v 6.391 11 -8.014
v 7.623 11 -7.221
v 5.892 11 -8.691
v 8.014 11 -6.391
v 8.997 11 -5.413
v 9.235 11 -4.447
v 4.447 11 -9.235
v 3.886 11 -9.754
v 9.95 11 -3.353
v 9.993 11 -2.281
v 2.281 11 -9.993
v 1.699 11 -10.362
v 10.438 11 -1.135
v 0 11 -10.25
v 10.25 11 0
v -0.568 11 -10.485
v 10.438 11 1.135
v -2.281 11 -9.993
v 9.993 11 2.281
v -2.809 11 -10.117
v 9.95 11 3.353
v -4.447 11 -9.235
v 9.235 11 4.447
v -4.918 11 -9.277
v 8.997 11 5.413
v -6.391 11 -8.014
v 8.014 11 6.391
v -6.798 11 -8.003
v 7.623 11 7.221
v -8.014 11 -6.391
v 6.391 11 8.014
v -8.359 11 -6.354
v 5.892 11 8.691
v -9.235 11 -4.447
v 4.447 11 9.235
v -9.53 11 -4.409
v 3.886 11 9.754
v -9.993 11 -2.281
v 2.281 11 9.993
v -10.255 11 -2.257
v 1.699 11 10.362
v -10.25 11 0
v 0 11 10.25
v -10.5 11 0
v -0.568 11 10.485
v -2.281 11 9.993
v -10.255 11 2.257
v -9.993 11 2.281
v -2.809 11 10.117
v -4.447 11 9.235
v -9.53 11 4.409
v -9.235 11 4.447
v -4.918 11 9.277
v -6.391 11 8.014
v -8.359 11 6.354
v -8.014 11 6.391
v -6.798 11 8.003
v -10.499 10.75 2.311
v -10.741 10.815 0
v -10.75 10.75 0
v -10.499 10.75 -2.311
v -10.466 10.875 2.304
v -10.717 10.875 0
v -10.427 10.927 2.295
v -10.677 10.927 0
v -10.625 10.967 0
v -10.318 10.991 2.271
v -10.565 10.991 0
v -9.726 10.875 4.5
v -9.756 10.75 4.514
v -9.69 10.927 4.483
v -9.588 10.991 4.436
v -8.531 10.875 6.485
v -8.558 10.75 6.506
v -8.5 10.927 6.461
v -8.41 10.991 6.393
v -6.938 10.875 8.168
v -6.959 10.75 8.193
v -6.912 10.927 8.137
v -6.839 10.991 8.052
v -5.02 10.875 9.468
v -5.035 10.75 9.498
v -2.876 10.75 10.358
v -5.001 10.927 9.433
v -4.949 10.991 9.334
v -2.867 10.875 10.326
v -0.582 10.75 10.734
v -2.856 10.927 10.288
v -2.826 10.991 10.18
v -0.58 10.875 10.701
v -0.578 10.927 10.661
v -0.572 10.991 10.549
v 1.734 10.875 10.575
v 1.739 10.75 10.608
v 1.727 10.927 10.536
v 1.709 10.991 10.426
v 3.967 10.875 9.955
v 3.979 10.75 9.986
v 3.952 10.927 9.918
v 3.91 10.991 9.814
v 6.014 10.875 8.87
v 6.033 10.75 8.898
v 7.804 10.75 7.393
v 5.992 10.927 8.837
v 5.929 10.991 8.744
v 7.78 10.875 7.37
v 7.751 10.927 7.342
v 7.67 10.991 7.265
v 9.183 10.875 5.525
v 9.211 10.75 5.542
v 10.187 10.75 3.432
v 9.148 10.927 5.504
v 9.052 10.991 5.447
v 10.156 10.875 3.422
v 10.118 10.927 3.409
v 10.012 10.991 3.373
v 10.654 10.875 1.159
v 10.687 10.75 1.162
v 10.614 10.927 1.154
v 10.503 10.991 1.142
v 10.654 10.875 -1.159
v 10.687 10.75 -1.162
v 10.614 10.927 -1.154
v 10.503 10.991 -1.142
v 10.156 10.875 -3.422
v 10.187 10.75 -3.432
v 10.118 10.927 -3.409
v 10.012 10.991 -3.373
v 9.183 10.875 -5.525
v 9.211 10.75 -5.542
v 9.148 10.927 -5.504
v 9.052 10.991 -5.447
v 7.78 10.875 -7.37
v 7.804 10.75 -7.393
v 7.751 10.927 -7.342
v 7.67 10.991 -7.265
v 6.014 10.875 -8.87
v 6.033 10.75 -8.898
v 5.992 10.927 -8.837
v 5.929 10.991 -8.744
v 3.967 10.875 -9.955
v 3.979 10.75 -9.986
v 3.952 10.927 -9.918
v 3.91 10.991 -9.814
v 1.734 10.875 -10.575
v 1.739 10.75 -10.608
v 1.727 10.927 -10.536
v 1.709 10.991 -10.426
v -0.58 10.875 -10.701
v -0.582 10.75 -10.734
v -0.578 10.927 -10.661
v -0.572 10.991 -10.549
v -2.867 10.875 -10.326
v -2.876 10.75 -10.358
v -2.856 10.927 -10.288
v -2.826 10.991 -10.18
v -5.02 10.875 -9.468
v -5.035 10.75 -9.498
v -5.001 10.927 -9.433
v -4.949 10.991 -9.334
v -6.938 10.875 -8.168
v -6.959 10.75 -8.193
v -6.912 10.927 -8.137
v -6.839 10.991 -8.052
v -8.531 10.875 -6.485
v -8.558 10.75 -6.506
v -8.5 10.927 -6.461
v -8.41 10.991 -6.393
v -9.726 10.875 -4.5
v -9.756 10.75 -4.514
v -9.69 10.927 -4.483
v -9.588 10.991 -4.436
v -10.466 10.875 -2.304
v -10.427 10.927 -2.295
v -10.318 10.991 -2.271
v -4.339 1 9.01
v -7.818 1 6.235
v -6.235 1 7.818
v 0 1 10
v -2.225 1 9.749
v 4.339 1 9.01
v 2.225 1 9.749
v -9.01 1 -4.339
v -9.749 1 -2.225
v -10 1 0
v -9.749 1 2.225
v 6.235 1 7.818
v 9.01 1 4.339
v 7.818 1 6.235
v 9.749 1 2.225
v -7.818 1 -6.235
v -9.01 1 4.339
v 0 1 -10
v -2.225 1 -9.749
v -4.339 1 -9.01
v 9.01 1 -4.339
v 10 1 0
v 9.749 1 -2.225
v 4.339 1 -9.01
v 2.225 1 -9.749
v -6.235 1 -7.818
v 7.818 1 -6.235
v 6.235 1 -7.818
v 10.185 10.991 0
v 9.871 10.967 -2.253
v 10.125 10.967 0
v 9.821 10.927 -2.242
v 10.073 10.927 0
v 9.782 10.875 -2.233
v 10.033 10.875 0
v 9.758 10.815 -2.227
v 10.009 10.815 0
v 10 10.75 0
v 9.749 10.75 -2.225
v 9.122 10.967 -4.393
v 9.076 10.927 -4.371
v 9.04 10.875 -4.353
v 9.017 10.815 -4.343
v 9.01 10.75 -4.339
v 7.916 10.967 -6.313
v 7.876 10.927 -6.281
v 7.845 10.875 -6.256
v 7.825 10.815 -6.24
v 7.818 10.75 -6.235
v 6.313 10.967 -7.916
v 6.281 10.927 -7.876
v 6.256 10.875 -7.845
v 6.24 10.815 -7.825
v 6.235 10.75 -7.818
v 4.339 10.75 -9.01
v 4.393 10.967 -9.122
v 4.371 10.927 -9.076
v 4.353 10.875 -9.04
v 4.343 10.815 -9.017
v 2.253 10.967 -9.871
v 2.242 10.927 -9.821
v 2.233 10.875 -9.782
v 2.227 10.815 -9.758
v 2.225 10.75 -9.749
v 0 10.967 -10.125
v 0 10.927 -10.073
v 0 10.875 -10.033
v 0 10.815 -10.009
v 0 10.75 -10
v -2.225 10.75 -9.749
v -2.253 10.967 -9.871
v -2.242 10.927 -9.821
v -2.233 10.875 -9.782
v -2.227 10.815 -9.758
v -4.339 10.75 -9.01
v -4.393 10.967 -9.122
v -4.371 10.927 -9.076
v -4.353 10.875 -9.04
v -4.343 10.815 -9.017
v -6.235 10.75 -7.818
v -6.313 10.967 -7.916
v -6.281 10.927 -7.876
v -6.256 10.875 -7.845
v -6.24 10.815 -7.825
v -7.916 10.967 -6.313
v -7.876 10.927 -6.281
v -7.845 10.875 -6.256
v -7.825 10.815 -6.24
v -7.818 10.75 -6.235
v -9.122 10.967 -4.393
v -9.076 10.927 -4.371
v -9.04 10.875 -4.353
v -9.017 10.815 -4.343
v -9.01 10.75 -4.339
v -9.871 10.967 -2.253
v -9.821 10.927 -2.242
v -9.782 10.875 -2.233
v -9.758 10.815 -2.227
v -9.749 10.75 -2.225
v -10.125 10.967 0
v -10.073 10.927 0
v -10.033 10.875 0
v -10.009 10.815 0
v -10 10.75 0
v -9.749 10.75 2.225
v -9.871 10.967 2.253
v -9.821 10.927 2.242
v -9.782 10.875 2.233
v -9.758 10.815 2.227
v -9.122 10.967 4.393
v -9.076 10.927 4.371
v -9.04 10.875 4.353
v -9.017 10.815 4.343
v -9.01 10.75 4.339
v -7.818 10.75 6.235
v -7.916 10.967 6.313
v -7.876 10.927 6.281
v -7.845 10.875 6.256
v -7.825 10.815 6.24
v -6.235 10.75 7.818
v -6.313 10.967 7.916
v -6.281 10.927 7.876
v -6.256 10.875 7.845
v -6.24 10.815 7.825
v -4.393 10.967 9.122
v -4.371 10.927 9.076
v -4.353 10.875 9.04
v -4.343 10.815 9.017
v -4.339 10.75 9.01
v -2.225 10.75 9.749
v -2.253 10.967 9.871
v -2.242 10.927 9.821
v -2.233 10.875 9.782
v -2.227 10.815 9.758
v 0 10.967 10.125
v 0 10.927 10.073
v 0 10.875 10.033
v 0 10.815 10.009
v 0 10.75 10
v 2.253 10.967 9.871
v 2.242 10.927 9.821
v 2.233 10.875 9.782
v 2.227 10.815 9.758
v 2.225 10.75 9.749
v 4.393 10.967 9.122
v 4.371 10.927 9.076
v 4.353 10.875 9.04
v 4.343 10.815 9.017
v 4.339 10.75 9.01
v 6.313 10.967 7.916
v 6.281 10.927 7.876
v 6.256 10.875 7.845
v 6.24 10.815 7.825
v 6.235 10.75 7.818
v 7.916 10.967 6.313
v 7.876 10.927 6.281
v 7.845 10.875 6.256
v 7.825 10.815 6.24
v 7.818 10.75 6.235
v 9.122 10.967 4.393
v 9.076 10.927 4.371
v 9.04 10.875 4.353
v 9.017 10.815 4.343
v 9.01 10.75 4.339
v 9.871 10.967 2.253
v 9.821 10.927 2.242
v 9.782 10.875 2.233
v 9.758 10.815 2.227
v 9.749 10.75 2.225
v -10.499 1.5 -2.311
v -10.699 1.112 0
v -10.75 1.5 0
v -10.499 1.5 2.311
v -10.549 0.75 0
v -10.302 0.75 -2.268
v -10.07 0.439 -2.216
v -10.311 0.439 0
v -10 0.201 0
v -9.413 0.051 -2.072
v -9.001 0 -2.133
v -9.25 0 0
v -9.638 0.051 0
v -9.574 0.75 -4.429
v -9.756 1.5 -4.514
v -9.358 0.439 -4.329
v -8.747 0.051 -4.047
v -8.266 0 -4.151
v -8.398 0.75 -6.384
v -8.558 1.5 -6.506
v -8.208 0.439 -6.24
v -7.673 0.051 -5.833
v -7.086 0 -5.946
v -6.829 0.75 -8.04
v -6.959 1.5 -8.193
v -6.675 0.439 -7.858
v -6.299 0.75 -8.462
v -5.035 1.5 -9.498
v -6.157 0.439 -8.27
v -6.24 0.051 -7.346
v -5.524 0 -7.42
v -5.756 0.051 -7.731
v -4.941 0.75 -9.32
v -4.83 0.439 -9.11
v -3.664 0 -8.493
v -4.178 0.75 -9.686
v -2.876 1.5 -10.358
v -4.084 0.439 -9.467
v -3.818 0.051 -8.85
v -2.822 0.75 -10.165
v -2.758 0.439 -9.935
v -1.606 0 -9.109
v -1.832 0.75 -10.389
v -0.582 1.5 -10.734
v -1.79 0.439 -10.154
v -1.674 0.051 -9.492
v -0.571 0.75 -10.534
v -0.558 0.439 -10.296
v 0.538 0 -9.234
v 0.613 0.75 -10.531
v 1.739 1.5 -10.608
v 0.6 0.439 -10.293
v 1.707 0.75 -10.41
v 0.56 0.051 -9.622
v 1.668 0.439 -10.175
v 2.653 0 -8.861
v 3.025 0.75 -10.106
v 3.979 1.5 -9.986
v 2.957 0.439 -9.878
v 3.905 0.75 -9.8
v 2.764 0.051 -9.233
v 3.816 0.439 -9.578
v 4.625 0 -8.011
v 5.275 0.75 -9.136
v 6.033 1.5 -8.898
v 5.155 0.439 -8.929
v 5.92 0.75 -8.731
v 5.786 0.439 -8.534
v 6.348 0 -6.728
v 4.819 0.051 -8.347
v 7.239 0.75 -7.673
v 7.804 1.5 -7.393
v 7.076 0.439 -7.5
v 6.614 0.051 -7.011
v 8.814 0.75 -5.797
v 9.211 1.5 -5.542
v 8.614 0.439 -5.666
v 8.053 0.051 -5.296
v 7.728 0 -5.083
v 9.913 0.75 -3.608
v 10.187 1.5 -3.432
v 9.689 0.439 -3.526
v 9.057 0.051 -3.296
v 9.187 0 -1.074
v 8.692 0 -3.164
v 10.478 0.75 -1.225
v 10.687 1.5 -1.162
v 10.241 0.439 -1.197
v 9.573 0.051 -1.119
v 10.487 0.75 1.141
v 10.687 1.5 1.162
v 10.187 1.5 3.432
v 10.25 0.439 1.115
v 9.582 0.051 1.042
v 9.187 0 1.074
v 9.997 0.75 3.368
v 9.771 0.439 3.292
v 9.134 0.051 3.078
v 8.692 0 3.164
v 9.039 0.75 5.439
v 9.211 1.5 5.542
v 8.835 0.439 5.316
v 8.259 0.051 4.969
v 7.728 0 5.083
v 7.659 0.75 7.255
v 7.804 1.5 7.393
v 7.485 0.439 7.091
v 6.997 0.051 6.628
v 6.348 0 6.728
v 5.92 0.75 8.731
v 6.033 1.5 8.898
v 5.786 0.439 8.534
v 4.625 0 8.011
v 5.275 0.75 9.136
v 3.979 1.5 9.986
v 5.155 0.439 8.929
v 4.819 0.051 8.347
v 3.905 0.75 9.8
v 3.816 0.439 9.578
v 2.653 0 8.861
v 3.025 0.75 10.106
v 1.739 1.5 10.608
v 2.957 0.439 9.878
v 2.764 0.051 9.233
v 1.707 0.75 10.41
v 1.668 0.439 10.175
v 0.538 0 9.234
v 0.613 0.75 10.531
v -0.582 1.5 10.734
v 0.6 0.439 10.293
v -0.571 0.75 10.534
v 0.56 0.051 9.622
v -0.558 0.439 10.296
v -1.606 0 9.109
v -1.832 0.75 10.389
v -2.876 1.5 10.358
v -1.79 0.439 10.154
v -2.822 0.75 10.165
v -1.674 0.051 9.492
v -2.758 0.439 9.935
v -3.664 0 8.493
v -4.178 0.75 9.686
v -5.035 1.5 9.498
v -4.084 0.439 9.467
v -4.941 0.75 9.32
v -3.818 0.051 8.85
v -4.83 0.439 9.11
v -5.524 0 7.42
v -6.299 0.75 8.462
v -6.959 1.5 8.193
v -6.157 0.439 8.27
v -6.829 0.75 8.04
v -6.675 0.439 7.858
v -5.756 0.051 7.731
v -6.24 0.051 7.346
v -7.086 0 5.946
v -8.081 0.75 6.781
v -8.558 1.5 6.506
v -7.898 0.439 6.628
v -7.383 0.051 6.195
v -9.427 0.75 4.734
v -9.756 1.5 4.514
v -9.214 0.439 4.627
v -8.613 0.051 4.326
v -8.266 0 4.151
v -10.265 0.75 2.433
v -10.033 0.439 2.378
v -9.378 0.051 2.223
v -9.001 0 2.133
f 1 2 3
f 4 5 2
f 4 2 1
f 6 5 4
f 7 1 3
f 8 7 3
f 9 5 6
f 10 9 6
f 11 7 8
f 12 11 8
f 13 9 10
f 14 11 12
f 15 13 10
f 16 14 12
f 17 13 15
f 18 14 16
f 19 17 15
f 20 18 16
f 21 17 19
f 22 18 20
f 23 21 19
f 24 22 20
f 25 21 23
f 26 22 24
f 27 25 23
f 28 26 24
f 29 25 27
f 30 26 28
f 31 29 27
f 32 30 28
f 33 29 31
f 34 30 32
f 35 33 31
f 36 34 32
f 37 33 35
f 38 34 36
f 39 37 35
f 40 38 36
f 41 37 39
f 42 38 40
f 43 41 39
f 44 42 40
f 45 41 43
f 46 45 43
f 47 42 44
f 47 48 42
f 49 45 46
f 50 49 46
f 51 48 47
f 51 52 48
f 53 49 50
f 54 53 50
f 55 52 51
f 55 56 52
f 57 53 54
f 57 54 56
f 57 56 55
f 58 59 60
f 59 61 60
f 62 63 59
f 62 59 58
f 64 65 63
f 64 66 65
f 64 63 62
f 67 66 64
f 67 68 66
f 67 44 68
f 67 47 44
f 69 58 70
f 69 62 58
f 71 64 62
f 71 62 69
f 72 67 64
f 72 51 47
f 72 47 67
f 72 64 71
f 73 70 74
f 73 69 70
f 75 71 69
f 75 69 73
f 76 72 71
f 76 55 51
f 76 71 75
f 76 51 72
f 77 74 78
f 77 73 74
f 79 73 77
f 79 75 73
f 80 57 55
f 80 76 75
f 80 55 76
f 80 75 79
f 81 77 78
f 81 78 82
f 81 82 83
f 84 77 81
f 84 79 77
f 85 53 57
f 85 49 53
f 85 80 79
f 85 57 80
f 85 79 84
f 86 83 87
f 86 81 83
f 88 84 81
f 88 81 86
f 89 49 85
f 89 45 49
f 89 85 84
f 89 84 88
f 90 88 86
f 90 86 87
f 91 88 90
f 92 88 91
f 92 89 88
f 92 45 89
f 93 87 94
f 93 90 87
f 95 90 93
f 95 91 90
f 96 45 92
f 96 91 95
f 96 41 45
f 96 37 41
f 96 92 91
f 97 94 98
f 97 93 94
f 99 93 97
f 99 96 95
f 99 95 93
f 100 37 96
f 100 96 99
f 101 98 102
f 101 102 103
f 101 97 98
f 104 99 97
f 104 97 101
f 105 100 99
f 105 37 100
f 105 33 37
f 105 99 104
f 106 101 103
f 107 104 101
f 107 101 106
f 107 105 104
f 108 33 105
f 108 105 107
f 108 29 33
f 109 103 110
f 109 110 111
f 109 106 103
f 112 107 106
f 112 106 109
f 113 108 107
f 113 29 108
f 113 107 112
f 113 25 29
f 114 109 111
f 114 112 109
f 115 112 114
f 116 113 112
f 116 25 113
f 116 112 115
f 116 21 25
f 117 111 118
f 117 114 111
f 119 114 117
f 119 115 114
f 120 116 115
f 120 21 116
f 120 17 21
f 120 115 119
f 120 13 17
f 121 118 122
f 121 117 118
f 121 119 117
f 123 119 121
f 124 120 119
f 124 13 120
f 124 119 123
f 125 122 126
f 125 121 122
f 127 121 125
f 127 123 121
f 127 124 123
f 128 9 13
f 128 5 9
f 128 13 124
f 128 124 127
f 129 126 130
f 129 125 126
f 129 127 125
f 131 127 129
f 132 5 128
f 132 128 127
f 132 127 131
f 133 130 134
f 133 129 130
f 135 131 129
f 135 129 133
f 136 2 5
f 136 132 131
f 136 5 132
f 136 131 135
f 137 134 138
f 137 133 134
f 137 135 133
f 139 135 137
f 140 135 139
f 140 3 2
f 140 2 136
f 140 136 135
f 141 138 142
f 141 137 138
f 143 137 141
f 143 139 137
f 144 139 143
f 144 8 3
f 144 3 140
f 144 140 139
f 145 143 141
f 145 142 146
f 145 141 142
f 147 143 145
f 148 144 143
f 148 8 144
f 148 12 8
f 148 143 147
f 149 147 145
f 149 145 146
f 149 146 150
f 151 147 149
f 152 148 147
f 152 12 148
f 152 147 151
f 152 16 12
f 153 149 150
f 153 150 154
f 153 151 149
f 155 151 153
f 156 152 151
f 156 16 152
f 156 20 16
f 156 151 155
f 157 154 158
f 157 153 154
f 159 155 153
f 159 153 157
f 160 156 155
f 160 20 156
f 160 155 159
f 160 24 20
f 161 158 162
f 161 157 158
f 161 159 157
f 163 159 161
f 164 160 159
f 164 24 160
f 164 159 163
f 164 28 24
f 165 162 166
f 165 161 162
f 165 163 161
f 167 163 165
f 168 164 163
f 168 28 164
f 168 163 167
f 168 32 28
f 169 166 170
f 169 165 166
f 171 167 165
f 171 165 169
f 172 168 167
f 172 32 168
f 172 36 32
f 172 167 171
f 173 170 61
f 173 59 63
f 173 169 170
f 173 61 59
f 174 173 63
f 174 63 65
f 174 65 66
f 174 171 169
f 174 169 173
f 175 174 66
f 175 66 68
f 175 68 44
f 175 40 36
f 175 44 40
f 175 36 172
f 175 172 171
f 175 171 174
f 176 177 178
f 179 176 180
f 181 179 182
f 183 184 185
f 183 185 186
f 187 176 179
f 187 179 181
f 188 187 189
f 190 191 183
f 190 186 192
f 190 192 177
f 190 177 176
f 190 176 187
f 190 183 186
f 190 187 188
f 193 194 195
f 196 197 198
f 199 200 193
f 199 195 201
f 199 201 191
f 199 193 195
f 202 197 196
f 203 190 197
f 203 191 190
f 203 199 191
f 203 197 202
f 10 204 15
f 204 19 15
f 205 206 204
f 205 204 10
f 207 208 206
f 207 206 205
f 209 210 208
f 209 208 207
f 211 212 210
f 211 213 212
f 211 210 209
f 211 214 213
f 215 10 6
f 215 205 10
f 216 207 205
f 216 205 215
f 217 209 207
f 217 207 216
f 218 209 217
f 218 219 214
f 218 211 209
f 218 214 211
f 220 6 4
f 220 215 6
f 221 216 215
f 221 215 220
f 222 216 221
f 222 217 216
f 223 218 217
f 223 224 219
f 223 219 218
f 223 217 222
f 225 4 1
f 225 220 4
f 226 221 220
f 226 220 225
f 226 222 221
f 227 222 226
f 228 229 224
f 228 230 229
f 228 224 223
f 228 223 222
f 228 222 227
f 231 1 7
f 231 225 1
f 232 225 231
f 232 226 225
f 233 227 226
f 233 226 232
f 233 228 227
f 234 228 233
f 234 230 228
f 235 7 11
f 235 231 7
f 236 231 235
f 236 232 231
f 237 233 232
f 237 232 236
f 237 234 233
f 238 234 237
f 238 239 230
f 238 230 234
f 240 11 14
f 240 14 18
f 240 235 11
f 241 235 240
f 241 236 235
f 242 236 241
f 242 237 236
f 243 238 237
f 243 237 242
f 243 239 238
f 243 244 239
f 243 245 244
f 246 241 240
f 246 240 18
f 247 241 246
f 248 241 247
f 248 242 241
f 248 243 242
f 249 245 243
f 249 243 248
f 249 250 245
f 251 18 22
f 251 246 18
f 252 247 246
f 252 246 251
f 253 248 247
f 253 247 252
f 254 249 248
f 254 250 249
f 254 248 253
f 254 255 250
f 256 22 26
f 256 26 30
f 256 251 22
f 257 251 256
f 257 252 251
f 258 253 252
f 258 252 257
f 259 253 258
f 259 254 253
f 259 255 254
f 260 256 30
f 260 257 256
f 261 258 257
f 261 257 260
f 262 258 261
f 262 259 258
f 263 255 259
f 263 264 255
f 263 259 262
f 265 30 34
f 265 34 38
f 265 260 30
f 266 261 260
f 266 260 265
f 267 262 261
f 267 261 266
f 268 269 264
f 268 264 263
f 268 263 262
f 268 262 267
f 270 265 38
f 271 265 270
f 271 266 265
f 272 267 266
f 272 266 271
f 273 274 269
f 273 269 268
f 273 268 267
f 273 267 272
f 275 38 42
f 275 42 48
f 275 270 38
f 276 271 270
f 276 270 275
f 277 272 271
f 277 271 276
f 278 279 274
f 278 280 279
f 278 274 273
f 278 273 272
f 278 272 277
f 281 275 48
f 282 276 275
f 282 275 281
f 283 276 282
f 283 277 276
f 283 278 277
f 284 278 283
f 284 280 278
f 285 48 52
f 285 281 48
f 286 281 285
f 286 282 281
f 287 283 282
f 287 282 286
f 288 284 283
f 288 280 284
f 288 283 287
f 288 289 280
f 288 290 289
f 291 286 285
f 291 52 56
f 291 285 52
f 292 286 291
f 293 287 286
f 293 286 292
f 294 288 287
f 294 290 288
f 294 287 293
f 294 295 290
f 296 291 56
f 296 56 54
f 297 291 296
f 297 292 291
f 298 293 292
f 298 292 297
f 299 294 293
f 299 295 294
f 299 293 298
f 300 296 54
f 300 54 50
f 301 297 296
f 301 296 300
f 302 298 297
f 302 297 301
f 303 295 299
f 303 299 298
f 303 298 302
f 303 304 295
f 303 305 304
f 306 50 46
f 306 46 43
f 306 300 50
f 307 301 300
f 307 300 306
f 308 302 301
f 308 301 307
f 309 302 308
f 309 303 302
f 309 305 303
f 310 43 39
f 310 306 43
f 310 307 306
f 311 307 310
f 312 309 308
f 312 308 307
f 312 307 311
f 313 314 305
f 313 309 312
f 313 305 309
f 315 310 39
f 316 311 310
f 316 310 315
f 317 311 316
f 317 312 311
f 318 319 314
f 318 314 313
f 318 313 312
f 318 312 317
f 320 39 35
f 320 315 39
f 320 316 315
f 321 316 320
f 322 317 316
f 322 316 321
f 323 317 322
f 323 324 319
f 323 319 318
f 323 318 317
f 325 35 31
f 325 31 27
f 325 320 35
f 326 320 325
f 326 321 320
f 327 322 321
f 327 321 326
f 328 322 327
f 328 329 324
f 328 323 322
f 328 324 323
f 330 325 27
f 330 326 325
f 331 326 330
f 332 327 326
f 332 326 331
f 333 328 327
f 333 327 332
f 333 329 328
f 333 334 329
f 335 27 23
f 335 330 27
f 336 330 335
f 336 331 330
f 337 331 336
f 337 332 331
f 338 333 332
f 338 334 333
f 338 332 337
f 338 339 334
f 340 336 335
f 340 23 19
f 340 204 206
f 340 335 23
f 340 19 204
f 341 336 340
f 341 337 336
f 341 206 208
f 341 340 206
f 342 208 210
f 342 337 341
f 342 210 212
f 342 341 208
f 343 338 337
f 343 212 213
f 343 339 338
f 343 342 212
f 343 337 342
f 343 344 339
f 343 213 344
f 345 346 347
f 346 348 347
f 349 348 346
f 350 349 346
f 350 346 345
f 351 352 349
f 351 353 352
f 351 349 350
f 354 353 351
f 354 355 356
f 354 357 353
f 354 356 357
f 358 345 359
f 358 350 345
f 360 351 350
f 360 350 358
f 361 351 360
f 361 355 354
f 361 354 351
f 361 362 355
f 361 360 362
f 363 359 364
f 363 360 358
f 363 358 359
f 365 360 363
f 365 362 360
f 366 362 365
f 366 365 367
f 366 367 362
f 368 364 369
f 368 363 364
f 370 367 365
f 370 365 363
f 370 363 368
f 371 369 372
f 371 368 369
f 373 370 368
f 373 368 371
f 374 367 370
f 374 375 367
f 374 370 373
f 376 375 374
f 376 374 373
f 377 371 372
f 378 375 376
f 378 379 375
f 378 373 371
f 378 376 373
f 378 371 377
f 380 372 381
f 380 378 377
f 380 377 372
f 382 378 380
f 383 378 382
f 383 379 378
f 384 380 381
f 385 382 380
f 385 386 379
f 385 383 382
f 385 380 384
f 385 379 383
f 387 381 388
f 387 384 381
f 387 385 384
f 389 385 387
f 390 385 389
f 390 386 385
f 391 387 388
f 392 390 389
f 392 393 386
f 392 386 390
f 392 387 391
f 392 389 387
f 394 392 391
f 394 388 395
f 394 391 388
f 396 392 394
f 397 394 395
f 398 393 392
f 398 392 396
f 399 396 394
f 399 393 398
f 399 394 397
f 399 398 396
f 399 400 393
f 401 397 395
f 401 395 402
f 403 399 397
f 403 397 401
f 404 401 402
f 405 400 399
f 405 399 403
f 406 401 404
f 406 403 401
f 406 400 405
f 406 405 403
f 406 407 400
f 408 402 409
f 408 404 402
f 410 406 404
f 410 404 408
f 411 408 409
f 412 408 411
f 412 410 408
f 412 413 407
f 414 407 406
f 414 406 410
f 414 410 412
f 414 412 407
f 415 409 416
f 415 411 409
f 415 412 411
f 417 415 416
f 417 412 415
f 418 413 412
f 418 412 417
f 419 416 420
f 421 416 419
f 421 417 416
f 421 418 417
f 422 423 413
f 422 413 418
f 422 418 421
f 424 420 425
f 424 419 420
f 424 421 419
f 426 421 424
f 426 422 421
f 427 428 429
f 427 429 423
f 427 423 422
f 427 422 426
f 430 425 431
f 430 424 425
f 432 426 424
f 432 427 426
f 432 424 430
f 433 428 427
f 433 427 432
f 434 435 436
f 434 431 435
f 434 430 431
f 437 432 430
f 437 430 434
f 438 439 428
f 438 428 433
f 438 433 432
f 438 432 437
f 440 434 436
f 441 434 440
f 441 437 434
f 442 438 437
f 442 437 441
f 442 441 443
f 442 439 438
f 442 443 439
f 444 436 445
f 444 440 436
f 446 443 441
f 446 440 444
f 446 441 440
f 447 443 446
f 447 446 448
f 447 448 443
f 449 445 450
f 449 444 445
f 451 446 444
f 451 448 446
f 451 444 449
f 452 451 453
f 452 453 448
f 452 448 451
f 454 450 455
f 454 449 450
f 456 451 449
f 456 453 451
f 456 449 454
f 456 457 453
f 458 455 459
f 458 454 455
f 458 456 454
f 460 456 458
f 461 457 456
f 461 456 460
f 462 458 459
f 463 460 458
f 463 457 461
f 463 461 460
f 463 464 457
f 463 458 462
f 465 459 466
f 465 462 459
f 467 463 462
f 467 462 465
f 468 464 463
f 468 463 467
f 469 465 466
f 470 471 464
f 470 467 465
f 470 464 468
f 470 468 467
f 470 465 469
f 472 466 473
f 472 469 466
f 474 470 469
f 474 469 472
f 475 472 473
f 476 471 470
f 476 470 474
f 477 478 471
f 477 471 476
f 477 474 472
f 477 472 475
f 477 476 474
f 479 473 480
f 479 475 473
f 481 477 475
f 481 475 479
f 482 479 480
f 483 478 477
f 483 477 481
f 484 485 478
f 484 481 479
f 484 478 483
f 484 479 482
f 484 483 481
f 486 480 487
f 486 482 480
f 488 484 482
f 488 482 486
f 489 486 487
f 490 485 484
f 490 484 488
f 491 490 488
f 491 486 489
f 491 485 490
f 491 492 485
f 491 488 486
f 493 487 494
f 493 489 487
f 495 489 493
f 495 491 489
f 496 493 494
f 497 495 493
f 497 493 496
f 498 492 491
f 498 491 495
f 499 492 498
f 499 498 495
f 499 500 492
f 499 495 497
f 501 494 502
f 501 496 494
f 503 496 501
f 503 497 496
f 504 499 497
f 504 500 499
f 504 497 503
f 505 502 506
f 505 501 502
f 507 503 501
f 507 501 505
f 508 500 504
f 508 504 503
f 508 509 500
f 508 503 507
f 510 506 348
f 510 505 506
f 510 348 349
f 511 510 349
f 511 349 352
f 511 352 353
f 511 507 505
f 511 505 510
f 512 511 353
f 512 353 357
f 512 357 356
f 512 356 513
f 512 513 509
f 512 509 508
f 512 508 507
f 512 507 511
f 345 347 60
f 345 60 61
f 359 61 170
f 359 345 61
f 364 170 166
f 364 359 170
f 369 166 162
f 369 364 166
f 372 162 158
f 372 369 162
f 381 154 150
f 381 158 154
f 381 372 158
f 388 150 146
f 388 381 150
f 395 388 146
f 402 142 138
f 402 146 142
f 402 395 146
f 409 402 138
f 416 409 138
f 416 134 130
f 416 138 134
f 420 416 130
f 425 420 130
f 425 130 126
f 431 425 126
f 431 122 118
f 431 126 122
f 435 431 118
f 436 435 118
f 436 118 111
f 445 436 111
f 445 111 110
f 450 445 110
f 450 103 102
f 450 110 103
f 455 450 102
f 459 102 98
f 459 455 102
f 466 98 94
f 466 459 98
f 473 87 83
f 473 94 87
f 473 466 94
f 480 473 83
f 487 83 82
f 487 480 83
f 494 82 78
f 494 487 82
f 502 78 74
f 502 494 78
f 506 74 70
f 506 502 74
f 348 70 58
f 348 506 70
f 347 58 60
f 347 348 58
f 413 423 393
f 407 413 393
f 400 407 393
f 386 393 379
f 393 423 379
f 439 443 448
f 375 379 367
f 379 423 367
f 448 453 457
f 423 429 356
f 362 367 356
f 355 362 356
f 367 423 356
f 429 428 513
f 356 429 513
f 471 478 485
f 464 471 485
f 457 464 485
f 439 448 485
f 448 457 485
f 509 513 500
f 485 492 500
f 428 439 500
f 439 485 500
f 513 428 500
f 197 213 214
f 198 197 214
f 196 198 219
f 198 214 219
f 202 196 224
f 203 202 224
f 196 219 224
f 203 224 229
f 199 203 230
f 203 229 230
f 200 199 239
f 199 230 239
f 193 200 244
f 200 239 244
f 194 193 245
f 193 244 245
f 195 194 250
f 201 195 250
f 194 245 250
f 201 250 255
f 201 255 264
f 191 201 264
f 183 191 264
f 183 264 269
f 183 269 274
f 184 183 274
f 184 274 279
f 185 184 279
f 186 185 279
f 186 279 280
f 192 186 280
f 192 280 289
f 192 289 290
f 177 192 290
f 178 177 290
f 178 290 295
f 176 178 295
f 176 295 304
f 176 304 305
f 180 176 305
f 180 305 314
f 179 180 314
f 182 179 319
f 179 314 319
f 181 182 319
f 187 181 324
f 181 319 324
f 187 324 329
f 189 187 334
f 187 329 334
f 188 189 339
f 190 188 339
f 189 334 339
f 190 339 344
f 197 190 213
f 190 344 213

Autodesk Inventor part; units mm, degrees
ref_plane "YZ Plane" through (0, 0, 0) normal (1, 0, 0) x (0, 1, 0)
ref_plane "XZ Plane" through (0, 0, 0) normal (0, 1, 0) x (-1, 0, 0)
ref_plane "XY Plane" through (0, 0, 0) normal (0, 0, 1) x (1, 0, 0)
sketch "Sketch1" plane through (0, 0, 0) normal (0, 1, 0) x (-1, 0, 0)
  circle A0 centre (0, 0) radius 10.75
  dimension "d0" = 21.5
extrude "Extrusion1" add sketch "Sketch1" along normal blind 11
sketch "Sketch2" plane through (0, 11, 0) normal (0, 1, 0) x (1, 0, 0)
  circle A0 centre (0, 0) radius 10
  dimension "d3" = 20
extrude "Extrusion2" cut sketch "Sketch2" against normal blind 10
fillet "Fillet1" radius 1.5 1 edges at (10.75, 0, 0)
fillet "Fillet2" radius 0.25 2 edges at (10.75, 11, 0) (-10, 11, 0)
thread "Thread1" size "M20x2.5" class "6H" standard "ANSI Metric M Profile" full length
sketch "Sketch3" plane through (0, 1, 0) normal (0, 1, 0) x (1, 0, 0)
  point P0 (0, 0)
sketch "Sketch4" plane through (0, 0, 0) normal (0, -1, 0) x (1, 0, 0)
  line L0 (-6.0026, 1.747) -> (5.8016, 1.747) construction
  line L1 (5.8016, 1.747) -> (5.8016, -1.301) construction
  line L2 (5.8016, -1.301) -> (-6.0026, -1.301) construction
  line L3 (-6.0026, -1.301) -> (-6.0026, 1.747) construction
  point P0 (0, 0)
properties part number "kork 32"
